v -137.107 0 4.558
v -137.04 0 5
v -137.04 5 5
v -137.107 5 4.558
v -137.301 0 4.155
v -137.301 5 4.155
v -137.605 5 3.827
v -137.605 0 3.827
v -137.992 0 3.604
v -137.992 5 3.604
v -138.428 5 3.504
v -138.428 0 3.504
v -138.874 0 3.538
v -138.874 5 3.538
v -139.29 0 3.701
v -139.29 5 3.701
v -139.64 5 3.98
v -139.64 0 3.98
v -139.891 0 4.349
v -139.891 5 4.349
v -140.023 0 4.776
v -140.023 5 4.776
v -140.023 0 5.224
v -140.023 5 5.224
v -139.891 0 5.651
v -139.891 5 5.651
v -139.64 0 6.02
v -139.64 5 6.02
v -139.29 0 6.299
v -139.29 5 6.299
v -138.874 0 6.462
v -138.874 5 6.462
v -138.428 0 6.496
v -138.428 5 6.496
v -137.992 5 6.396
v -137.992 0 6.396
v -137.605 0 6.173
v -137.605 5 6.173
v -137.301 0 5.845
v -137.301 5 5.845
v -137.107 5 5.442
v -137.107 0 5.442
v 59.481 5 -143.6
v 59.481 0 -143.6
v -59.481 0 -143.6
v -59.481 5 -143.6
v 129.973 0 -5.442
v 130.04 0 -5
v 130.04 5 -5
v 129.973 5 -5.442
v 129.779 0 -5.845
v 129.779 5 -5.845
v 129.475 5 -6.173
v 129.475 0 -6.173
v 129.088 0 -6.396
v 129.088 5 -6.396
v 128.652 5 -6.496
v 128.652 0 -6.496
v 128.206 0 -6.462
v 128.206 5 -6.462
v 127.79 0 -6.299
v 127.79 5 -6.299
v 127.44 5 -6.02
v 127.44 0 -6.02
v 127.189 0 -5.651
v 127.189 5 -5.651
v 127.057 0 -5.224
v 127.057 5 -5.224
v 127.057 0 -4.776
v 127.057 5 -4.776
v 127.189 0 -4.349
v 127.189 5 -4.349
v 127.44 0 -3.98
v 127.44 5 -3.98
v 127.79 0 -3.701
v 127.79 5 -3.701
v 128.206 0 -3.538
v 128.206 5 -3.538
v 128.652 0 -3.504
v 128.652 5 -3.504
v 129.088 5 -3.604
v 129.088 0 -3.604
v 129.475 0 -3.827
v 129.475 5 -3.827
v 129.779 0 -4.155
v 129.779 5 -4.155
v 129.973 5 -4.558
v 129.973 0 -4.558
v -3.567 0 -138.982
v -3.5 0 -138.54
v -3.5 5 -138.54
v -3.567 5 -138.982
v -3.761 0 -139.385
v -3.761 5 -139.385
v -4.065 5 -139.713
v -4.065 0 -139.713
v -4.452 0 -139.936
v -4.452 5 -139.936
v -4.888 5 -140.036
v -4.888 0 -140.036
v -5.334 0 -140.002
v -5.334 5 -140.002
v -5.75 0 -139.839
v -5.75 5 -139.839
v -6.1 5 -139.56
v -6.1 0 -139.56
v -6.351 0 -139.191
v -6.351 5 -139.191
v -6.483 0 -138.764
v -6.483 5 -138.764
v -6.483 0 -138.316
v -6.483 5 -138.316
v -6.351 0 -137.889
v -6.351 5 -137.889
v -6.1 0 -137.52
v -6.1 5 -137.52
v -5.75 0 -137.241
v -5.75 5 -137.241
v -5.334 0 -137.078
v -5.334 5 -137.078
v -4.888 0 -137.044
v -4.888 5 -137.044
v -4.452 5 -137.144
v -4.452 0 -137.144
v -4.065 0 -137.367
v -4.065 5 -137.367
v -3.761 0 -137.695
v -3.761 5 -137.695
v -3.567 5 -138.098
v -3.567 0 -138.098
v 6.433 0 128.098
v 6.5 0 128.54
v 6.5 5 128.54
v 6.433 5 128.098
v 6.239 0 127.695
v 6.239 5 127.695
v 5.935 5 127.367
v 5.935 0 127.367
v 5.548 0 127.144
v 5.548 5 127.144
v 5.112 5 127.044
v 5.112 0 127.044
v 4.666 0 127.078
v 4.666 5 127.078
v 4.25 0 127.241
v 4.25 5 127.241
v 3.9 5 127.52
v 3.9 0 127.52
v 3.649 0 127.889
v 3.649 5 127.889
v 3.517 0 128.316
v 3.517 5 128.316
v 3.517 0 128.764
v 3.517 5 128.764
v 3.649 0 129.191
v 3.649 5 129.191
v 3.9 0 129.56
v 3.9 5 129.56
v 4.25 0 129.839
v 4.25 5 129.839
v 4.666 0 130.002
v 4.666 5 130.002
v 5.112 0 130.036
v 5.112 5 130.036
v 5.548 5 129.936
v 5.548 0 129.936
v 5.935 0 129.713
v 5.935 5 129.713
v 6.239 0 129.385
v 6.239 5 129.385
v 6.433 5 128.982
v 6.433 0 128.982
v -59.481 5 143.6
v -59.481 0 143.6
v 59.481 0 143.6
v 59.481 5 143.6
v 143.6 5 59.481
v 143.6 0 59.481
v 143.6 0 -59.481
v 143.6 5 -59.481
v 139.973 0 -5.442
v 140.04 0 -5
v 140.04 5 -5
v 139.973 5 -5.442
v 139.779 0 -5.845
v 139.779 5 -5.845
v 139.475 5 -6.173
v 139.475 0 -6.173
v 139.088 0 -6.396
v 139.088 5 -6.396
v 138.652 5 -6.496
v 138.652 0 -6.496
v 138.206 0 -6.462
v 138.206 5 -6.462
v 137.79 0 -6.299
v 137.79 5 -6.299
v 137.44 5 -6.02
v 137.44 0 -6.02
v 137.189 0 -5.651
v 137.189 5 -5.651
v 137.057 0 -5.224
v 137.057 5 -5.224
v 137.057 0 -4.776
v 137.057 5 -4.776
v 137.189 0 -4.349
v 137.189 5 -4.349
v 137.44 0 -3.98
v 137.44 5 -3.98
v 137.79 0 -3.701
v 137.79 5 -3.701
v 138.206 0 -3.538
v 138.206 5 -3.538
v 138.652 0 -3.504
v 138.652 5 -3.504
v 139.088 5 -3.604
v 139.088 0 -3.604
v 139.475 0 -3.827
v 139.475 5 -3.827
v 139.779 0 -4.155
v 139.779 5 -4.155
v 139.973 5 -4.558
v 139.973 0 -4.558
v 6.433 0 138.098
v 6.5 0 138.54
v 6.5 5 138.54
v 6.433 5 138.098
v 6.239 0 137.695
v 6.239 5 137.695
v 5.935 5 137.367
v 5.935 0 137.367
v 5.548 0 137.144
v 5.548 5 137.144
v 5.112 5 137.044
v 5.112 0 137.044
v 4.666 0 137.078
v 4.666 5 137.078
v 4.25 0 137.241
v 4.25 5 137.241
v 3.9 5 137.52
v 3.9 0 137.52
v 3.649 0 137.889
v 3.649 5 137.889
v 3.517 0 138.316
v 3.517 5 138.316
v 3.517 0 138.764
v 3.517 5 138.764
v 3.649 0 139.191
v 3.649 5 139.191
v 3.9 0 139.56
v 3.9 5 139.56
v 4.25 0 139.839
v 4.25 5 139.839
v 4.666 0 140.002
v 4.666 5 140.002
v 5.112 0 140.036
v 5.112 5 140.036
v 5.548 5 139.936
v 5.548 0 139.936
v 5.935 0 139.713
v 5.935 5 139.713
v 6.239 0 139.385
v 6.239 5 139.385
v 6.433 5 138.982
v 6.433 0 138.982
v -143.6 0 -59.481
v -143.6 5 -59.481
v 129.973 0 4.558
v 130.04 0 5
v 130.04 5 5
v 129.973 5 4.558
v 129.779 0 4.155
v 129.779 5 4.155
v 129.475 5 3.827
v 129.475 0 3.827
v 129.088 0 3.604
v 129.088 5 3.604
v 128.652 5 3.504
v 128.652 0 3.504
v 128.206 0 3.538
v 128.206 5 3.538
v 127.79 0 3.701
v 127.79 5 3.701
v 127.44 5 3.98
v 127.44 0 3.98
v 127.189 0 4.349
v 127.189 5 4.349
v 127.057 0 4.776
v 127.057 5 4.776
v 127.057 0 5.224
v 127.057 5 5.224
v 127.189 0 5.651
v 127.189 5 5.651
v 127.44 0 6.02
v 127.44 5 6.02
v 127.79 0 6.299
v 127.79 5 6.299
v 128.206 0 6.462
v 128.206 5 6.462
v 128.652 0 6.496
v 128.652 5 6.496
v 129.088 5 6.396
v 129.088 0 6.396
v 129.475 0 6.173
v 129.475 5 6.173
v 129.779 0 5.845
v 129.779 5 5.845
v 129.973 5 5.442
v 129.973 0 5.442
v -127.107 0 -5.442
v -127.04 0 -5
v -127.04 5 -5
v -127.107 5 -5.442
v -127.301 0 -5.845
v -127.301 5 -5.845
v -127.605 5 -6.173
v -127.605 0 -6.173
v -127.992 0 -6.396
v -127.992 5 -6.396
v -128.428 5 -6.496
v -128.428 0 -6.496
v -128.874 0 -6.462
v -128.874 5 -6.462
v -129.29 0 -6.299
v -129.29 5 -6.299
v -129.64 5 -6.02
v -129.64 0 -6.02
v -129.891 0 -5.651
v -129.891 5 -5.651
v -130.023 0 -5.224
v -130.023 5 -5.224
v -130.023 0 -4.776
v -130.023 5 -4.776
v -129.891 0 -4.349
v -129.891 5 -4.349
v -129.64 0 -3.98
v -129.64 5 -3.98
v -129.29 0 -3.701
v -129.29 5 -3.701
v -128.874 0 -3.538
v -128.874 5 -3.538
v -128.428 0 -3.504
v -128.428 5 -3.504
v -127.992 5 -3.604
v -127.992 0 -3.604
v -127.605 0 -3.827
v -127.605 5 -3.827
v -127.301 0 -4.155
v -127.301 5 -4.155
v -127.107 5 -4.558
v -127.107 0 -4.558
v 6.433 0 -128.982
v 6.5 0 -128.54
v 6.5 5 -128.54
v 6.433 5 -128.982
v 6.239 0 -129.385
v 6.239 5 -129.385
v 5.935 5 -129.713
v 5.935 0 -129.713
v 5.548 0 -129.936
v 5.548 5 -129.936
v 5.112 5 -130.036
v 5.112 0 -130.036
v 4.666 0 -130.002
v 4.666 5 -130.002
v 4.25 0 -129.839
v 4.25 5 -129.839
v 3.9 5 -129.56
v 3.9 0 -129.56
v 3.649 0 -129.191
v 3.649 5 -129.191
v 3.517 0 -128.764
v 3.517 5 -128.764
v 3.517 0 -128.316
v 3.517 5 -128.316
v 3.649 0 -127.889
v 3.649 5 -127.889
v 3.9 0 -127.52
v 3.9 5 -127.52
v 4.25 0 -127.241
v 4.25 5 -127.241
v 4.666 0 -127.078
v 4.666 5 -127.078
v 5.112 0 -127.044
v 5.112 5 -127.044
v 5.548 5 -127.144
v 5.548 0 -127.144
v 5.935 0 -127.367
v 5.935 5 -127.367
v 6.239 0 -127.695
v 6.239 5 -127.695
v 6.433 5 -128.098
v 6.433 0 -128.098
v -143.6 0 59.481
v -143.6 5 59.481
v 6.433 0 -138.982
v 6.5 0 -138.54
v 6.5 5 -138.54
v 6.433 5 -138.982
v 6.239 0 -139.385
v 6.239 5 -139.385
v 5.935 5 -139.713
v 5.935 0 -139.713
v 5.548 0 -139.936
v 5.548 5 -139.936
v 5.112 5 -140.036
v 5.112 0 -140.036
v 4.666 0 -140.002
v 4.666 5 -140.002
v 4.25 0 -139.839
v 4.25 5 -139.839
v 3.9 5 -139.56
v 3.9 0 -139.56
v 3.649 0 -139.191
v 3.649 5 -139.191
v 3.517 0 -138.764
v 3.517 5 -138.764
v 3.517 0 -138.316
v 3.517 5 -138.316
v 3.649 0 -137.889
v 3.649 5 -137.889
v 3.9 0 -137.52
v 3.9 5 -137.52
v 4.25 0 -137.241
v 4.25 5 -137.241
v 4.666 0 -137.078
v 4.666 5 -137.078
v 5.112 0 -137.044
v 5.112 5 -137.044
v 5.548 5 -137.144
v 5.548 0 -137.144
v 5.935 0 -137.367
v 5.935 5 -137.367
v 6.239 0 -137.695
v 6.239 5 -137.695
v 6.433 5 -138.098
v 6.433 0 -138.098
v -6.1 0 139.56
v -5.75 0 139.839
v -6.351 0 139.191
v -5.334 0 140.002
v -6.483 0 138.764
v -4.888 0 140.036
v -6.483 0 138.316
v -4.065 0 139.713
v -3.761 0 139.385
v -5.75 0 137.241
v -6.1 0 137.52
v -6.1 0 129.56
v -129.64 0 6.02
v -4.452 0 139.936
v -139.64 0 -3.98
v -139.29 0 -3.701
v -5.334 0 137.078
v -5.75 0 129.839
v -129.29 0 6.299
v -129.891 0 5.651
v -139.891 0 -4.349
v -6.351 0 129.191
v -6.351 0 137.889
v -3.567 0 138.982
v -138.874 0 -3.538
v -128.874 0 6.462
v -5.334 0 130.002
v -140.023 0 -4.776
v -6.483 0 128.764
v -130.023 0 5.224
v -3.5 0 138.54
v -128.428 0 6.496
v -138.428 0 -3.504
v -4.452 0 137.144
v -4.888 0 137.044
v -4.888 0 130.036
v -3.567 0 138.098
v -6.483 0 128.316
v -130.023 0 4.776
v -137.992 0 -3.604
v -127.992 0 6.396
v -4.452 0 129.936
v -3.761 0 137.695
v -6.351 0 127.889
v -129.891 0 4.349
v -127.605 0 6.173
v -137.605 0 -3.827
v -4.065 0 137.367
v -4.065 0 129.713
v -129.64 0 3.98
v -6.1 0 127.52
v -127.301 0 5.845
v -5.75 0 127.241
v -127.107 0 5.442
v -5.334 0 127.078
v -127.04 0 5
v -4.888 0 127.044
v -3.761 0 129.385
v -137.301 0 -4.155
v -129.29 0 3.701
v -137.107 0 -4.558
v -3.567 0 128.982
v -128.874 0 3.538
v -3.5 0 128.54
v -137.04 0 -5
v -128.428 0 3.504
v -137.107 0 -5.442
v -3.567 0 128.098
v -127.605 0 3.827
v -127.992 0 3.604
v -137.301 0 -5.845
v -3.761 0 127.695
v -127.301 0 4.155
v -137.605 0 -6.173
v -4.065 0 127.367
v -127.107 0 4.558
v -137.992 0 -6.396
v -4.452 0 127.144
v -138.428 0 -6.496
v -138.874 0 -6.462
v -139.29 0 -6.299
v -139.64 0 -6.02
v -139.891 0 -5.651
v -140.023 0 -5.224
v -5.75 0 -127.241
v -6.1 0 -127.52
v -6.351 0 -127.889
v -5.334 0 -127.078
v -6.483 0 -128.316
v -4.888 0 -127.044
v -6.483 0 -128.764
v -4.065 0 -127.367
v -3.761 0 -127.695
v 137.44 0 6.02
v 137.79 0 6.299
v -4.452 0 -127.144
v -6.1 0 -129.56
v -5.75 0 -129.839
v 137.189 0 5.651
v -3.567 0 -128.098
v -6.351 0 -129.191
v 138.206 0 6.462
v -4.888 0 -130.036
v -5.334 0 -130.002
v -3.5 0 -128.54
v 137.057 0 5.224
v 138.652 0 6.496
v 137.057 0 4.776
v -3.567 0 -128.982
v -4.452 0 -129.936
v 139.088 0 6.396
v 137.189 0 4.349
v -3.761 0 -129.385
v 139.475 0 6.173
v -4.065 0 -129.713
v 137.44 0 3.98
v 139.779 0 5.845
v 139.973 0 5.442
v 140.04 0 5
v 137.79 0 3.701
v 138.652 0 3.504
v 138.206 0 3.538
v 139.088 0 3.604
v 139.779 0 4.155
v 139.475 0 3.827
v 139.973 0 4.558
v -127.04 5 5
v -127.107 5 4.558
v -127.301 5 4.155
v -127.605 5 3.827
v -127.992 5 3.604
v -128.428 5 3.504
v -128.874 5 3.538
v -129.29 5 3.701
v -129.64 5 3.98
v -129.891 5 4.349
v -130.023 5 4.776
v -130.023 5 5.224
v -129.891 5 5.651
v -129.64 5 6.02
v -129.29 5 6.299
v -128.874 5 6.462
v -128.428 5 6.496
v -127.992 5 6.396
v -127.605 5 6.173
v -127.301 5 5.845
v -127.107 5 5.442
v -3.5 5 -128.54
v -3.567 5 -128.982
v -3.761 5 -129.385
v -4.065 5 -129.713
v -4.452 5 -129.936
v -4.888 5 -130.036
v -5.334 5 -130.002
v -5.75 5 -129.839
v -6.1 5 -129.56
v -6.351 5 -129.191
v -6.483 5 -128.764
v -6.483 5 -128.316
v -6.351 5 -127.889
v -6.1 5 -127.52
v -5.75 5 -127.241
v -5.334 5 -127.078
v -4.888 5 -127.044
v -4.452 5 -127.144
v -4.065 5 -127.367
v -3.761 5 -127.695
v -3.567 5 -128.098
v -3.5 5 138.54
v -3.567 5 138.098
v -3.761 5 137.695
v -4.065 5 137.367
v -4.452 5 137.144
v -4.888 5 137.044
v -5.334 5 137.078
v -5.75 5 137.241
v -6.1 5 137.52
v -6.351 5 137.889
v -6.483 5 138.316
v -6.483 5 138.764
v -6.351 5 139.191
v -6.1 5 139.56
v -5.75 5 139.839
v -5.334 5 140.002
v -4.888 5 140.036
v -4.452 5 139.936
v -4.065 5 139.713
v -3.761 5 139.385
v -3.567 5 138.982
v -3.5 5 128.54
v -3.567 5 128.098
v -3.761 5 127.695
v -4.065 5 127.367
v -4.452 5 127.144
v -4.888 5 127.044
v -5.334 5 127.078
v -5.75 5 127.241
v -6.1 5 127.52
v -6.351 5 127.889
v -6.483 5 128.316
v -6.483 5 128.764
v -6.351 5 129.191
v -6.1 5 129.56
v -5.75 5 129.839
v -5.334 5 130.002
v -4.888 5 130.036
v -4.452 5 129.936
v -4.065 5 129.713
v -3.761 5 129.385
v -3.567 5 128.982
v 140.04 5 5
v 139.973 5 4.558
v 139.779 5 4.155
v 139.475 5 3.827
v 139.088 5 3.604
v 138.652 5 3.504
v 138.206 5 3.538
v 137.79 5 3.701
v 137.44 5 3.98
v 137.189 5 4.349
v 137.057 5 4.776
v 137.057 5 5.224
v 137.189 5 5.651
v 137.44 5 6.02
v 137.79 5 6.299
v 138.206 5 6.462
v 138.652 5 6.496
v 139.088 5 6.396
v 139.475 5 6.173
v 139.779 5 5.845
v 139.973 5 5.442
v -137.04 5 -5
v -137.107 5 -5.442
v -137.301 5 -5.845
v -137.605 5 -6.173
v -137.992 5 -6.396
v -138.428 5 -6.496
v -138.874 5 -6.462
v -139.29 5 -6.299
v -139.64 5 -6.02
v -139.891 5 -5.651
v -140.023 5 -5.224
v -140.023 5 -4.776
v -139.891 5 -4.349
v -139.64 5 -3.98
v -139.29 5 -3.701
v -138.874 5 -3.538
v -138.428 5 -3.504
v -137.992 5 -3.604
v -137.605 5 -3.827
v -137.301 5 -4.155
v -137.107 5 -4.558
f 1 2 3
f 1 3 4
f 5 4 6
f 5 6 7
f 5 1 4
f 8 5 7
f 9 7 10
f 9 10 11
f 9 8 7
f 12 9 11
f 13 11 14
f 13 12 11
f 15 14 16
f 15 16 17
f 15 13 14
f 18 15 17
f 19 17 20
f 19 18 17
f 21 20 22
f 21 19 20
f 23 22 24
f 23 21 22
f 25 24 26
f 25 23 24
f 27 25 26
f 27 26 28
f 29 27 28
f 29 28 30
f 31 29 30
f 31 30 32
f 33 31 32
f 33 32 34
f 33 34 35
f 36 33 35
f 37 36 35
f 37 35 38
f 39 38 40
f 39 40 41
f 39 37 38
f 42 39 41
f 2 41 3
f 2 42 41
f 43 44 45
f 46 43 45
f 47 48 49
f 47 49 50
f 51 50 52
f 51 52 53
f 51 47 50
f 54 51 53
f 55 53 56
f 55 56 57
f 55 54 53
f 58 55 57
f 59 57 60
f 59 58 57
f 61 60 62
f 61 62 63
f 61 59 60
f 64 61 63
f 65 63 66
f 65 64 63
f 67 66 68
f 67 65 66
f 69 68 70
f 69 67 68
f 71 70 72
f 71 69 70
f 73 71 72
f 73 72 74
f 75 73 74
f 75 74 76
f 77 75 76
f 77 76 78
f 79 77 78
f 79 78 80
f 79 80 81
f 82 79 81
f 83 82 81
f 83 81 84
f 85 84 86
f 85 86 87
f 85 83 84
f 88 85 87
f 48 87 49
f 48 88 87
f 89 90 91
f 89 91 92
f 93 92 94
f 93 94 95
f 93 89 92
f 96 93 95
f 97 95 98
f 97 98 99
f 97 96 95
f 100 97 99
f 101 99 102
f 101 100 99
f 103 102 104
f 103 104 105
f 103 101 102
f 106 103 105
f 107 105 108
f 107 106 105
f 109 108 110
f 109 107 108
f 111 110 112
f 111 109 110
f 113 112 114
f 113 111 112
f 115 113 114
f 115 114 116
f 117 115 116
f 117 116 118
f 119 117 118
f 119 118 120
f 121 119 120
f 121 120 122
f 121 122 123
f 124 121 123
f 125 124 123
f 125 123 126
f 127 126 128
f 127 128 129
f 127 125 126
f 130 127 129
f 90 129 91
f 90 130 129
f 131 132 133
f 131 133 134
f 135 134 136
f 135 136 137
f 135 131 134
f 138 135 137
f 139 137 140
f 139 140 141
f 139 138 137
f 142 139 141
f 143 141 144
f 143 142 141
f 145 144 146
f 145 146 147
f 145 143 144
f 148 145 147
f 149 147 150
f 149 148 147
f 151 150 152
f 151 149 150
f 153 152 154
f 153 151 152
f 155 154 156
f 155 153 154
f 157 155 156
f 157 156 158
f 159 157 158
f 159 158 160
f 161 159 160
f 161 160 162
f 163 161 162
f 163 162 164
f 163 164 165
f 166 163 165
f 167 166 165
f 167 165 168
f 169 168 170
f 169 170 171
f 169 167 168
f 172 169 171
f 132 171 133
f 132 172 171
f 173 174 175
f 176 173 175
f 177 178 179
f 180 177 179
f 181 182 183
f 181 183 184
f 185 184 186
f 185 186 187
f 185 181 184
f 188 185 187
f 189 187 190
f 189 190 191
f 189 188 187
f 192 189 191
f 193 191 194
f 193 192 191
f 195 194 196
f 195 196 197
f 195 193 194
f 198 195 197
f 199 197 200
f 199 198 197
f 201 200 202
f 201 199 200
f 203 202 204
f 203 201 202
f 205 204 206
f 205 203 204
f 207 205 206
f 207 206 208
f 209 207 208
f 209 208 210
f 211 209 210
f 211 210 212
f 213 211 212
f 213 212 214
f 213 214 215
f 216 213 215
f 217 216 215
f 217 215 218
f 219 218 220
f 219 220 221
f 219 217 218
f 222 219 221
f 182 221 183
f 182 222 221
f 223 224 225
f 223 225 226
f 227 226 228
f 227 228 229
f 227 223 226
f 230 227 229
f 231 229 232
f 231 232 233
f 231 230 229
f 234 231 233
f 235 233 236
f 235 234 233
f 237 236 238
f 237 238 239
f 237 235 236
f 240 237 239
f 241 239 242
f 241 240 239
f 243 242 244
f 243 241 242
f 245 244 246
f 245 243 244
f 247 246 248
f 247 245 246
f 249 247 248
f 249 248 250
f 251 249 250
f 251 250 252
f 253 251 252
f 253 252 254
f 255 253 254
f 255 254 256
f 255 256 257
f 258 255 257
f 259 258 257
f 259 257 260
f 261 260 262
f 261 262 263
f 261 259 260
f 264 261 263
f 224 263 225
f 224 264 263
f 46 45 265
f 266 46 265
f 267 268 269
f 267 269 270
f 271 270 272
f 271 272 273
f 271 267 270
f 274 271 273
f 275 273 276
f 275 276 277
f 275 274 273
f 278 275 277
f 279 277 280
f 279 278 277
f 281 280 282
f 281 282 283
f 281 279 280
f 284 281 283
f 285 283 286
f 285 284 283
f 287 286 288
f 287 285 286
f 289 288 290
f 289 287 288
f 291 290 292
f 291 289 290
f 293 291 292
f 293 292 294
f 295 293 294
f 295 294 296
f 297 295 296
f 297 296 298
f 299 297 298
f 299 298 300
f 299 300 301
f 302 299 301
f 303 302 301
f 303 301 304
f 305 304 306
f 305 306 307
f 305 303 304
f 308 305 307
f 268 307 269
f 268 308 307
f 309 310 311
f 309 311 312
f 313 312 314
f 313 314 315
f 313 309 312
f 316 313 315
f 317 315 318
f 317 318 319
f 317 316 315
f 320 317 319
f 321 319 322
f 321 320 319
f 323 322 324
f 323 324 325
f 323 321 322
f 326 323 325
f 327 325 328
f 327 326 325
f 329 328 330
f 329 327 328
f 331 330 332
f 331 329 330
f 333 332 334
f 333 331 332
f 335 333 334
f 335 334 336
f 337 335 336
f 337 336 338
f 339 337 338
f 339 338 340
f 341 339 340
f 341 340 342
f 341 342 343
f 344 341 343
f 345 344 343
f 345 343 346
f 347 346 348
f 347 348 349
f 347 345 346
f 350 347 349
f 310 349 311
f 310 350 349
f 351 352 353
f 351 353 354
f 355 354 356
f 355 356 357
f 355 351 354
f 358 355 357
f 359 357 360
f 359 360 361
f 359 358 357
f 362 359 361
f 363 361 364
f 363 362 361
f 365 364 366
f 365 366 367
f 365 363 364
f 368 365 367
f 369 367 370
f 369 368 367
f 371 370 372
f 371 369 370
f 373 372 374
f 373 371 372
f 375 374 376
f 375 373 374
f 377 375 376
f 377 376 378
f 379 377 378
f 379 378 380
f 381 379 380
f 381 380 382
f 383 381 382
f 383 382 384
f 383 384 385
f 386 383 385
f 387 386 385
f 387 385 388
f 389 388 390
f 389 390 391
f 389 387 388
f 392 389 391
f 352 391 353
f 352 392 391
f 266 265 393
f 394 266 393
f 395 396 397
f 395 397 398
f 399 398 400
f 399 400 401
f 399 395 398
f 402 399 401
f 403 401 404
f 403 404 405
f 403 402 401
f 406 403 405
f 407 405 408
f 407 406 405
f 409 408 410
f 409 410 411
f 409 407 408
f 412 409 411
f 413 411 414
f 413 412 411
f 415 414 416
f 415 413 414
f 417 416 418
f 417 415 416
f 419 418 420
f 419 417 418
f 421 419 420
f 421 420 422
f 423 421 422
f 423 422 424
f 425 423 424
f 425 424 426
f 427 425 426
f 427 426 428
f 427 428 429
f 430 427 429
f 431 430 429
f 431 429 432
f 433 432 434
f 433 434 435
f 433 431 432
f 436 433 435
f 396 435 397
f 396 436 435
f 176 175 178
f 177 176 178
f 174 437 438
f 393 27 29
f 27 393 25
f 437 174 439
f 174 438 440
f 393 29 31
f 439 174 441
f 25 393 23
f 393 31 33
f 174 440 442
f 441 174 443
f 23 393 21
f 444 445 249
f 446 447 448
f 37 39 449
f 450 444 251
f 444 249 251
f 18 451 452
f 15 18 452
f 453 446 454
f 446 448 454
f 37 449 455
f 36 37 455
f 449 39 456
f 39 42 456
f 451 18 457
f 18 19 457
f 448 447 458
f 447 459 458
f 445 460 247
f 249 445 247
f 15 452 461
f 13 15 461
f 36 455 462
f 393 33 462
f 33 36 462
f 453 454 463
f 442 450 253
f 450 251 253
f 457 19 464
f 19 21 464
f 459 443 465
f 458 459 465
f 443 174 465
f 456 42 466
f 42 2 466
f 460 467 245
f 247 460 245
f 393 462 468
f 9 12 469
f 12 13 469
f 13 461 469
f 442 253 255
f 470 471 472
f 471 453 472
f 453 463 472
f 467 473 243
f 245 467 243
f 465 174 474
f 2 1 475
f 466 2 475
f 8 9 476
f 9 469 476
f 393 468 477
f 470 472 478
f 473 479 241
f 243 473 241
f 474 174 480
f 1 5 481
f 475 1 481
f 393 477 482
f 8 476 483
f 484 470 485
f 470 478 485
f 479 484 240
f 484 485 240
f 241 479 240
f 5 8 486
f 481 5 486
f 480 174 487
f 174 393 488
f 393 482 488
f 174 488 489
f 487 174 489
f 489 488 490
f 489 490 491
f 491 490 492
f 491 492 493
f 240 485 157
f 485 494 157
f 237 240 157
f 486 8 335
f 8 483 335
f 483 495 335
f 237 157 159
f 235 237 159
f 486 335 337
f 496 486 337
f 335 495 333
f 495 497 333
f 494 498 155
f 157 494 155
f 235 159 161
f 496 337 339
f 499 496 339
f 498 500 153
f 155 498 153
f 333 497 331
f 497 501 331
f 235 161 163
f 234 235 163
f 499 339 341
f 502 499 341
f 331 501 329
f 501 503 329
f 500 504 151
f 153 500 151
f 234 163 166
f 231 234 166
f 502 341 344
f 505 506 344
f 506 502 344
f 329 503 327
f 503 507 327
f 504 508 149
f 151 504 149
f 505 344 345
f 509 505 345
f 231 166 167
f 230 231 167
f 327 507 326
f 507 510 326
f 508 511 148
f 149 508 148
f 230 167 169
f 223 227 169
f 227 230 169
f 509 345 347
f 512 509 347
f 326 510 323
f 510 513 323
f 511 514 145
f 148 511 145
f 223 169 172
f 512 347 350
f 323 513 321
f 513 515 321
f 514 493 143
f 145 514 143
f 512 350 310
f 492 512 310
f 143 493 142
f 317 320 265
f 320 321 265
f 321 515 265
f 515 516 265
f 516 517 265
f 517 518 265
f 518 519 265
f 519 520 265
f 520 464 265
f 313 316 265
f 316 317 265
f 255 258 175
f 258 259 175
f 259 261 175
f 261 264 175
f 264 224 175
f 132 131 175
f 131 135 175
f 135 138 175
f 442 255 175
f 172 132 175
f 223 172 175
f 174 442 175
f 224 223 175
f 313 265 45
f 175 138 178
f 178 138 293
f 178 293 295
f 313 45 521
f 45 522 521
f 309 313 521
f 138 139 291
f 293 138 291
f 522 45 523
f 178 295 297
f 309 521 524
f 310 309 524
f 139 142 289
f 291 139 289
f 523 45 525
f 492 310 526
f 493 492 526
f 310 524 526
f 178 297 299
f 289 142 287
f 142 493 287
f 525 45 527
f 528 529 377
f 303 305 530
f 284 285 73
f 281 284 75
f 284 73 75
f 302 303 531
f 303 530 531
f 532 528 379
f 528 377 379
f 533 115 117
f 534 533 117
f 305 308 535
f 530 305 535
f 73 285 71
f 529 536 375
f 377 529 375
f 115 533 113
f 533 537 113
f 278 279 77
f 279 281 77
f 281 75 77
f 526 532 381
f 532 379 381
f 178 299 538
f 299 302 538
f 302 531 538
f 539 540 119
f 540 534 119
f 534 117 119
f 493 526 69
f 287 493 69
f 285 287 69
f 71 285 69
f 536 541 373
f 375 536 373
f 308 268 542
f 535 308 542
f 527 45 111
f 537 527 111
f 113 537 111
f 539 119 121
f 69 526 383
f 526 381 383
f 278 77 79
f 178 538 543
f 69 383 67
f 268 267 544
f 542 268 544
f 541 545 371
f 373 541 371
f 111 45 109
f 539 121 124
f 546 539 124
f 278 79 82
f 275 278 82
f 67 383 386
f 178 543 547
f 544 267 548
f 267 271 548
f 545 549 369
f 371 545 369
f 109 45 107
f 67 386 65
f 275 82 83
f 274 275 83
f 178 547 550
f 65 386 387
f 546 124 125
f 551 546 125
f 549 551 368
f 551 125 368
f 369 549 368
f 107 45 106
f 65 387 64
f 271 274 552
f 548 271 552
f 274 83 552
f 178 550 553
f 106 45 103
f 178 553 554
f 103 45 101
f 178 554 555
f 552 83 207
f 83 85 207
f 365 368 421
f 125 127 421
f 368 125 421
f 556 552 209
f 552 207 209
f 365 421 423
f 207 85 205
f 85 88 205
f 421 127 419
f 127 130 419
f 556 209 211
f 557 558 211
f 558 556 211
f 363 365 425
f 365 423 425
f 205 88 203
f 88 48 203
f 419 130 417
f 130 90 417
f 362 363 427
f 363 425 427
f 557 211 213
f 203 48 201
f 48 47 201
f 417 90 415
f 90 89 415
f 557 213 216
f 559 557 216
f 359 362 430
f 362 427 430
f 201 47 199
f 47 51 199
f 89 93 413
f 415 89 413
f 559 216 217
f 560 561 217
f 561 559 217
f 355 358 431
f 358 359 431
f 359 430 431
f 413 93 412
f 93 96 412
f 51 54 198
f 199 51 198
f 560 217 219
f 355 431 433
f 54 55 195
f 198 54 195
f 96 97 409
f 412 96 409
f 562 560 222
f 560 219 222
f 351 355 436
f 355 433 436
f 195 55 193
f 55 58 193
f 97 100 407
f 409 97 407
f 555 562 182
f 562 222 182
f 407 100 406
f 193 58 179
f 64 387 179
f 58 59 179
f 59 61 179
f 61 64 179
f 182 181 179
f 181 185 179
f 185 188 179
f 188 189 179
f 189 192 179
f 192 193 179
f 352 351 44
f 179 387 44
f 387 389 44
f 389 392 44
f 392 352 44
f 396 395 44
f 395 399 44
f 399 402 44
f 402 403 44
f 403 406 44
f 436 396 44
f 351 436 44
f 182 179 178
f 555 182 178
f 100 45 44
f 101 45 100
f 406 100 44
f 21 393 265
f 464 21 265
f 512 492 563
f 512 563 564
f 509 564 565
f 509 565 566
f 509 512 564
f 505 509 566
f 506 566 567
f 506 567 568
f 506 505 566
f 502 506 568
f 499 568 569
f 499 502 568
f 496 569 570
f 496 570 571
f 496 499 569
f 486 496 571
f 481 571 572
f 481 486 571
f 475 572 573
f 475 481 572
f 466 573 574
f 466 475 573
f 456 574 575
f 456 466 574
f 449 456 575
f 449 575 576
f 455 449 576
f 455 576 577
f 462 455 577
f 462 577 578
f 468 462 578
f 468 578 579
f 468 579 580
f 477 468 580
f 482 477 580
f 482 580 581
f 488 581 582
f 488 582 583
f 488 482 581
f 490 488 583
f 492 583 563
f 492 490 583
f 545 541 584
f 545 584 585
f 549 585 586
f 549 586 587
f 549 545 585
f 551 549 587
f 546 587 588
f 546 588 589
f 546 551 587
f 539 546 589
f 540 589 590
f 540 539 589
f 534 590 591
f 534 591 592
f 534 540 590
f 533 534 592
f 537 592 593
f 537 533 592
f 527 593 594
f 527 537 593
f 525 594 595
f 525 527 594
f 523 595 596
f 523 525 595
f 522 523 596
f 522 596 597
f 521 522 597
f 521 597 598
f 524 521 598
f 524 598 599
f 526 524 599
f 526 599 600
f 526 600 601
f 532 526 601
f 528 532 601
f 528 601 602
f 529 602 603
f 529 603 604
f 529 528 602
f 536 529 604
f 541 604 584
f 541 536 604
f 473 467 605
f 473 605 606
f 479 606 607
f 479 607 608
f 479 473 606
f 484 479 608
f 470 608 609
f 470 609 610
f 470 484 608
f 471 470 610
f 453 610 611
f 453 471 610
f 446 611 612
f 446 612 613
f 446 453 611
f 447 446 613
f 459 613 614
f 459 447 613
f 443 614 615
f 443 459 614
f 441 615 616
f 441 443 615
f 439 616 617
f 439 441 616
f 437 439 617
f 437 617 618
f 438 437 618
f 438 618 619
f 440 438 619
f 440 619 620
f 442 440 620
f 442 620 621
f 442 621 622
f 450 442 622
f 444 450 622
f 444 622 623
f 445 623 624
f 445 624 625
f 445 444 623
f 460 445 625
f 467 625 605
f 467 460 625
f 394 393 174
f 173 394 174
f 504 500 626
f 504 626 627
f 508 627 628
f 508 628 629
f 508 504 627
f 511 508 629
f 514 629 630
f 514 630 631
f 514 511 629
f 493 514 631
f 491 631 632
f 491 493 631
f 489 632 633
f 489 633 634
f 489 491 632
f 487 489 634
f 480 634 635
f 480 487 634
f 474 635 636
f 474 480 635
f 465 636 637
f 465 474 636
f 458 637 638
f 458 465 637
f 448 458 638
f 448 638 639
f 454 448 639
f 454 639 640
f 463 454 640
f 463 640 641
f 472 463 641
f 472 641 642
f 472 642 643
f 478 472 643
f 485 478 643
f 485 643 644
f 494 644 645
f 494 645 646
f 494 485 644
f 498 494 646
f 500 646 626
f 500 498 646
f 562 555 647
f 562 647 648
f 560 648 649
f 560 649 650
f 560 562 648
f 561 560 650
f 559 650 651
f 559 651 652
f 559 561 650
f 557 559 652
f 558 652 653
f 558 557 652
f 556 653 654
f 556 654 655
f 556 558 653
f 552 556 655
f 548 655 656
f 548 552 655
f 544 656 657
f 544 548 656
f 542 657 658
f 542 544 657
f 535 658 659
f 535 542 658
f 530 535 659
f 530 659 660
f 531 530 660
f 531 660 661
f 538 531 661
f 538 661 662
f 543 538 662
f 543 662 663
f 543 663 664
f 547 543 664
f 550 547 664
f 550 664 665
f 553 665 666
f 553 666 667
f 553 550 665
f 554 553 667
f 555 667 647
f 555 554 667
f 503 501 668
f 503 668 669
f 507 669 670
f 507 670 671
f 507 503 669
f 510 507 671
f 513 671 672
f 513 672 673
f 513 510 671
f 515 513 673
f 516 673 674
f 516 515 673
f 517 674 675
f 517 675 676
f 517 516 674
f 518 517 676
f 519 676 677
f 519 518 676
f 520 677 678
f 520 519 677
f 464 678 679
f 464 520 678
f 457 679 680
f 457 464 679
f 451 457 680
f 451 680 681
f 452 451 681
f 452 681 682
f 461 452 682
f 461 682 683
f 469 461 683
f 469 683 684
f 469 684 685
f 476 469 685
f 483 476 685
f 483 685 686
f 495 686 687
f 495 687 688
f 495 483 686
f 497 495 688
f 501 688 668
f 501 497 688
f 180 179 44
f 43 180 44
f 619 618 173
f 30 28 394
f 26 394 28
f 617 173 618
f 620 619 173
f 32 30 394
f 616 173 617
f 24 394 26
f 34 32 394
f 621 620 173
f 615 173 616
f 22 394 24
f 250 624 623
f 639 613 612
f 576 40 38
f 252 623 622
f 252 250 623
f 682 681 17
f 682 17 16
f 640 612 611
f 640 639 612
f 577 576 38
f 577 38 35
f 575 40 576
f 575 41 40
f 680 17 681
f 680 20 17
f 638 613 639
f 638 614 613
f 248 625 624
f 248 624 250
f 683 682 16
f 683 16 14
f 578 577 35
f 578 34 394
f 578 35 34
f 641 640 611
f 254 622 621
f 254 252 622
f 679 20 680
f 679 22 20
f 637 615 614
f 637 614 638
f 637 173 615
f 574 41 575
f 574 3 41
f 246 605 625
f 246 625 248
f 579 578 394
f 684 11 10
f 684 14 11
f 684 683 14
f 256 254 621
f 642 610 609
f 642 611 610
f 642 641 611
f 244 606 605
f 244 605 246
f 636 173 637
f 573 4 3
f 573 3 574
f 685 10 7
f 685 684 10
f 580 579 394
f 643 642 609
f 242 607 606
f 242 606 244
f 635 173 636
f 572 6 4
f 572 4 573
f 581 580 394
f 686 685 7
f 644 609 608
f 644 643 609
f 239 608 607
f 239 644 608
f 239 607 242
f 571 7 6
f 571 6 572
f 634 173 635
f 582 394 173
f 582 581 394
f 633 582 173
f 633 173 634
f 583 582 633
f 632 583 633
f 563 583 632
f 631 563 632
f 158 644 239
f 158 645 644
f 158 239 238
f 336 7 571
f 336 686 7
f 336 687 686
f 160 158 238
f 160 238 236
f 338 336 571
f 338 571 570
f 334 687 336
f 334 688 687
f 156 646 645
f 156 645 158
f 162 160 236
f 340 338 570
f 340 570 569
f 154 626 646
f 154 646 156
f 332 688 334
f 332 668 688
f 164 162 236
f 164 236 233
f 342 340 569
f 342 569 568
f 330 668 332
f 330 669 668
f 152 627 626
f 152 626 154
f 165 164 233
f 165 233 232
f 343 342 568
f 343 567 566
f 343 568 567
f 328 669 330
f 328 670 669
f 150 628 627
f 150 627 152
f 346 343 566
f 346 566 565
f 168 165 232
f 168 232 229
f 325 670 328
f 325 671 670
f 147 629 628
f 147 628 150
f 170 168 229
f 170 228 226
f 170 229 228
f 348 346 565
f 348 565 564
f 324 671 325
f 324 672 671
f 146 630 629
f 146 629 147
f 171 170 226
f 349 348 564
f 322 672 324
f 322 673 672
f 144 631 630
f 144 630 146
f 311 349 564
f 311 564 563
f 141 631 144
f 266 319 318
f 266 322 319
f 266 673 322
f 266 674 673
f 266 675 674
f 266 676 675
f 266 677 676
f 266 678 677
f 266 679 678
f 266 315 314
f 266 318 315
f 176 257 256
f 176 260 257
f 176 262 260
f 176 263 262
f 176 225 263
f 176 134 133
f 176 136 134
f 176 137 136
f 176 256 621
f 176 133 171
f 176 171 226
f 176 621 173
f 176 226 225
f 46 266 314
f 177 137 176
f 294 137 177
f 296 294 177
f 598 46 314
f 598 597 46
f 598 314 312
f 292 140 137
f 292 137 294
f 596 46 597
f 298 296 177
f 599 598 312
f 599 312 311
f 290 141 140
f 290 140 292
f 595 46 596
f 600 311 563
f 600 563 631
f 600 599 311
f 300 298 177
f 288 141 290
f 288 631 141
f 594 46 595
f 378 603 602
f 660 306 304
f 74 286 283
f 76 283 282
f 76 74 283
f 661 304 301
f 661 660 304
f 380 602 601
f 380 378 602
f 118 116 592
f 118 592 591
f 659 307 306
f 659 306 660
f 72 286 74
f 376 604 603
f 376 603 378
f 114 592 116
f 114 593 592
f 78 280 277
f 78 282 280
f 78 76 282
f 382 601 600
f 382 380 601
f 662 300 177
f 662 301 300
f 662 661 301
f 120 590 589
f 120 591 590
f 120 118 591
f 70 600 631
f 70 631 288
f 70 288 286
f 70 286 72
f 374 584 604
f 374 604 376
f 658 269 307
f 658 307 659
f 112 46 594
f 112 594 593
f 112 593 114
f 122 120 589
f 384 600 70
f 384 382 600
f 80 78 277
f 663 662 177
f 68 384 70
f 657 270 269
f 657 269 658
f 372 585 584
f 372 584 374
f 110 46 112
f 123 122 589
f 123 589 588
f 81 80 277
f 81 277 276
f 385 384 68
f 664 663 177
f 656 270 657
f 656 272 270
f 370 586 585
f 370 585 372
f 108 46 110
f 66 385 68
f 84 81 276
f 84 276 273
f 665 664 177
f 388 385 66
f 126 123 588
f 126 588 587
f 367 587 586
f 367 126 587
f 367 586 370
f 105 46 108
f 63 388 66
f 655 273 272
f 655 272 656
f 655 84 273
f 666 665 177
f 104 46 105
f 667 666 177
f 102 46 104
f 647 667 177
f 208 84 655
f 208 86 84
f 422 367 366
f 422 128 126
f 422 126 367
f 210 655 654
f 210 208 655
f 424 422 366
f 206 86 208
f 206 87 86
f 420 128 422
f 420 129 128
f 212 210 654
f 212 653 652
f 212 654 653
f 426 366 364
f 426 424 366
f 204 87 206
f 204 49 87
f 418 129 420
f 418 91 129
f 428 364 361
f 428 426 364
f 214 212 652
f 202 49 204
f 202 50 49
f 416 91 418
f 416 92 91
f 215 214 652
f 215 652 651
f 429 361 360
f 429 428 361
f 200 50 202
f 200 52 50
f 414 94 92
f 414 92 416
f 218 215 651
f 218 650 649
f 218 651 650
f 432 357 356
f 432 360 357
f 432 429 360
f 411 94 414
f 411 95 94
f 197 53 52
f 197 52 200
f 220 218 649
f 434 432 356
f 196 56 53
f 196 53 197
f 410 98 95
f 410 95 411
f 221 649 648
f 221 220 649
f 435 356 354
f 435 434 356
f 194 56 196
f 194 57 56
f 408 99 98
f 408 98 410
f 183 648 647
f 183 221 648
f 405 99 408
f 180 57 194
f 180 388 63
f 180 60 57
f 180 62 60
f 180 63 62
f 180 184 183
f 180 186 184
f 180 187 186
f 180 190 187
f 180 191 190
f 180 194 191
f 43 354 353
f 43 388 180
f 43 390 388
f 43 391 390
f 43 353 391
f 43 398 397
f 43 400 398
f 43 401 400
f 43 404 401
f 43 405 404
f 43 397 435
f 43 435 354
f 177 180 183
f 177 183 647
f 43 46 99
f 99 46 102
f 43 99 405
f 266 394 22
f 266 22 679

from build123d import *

# Parameters (mm, degrees)
SKETCH_1_R      = 1.5
EXTRUDE_1_DEPTH = 5


with BuildPart() as part:
    # 스케치1 → 보스-돌출1 (new body)
    with BuildSketch(Plane(origin=(0, 0, 0), x_dir=(1, 0, 0), z_dir=(0, 1, 0))):
        Polygon((59.481067557, -143.6), (143.6, -59.481067557), (143.6, 59.481067557), (59.481067557, 143.6), (-59.481067557, 143.6), (-143.6, 59.481067557), (-143.6, -59.481067557), (-59.481067557, -143.6), align=None)
        with Locations((-5, 138.54)):
            Circle(SKETCH_1_R, mode=Mode.SUBTRACT)
        with Locations((-5, 128.54)):
            Circle(SKETCH_1_R, mode=Mode.SUBTRACT)
        with Locations((5, 128.54)):
            Circle(SKETCH_1_R, mode=Mode.SUBTRACT)
        with Locations((5, 138.54)):
            Circle(SKETCH_1_R, mode=Mode.SUBTRACT)
        with Locations((138.54, 5)):
            Circle(SKETCH_1_R, mode=Mode.SUBTRACT)
        with Locations((128.54, 5)):
            Circle(SKETCH_1_R, mode=Mode.SUBTRACT)
        with Locations((128.54, -5)):
            Circle(SKETCH_1_R, mode=Mode.SUBTRACT)
        with Locations((138.54, -5)):
            Circle(SKETCH_1_R, mode=Mode.SUBTRACT)
        with Locations((5, -138.54)):
            Circle(SKETCH_1_R, mode=Mode.SUBTRACT)
        with Locations((5, -128.54)):
            Circle(SKETCH_1_R, mode=Mode.SUBTRACT)
        with Locations((-5, -128.54)):
            Circle(SKETCH_1_R, mode=Mode.SUBTRACT)
        with Locations((-5, -138.54)):
            Circle(SKETCH_1_R, mode=Mode.SUBTRACT)
        with Locations((-138.54, -5)):
            Circle(SKETCH_1_R, mode=Mode.SUBTRACT)
        with Locations((-128.54, -5)):
            Circle(SKETCH_1_R, mode=Mode.SUBTRACT)
        with Locations((-128.54, 5)):
            Circle(SKETCH_1_R, mode=Mode.SUBTRACT)
        with Locations((-138.54, 5)):
            Circle(SKETCH_1_R, mode=Mode.SUBTRACT)
    extrude(amount=EXTRUDE_1_DEPTH)


solid = part.part
